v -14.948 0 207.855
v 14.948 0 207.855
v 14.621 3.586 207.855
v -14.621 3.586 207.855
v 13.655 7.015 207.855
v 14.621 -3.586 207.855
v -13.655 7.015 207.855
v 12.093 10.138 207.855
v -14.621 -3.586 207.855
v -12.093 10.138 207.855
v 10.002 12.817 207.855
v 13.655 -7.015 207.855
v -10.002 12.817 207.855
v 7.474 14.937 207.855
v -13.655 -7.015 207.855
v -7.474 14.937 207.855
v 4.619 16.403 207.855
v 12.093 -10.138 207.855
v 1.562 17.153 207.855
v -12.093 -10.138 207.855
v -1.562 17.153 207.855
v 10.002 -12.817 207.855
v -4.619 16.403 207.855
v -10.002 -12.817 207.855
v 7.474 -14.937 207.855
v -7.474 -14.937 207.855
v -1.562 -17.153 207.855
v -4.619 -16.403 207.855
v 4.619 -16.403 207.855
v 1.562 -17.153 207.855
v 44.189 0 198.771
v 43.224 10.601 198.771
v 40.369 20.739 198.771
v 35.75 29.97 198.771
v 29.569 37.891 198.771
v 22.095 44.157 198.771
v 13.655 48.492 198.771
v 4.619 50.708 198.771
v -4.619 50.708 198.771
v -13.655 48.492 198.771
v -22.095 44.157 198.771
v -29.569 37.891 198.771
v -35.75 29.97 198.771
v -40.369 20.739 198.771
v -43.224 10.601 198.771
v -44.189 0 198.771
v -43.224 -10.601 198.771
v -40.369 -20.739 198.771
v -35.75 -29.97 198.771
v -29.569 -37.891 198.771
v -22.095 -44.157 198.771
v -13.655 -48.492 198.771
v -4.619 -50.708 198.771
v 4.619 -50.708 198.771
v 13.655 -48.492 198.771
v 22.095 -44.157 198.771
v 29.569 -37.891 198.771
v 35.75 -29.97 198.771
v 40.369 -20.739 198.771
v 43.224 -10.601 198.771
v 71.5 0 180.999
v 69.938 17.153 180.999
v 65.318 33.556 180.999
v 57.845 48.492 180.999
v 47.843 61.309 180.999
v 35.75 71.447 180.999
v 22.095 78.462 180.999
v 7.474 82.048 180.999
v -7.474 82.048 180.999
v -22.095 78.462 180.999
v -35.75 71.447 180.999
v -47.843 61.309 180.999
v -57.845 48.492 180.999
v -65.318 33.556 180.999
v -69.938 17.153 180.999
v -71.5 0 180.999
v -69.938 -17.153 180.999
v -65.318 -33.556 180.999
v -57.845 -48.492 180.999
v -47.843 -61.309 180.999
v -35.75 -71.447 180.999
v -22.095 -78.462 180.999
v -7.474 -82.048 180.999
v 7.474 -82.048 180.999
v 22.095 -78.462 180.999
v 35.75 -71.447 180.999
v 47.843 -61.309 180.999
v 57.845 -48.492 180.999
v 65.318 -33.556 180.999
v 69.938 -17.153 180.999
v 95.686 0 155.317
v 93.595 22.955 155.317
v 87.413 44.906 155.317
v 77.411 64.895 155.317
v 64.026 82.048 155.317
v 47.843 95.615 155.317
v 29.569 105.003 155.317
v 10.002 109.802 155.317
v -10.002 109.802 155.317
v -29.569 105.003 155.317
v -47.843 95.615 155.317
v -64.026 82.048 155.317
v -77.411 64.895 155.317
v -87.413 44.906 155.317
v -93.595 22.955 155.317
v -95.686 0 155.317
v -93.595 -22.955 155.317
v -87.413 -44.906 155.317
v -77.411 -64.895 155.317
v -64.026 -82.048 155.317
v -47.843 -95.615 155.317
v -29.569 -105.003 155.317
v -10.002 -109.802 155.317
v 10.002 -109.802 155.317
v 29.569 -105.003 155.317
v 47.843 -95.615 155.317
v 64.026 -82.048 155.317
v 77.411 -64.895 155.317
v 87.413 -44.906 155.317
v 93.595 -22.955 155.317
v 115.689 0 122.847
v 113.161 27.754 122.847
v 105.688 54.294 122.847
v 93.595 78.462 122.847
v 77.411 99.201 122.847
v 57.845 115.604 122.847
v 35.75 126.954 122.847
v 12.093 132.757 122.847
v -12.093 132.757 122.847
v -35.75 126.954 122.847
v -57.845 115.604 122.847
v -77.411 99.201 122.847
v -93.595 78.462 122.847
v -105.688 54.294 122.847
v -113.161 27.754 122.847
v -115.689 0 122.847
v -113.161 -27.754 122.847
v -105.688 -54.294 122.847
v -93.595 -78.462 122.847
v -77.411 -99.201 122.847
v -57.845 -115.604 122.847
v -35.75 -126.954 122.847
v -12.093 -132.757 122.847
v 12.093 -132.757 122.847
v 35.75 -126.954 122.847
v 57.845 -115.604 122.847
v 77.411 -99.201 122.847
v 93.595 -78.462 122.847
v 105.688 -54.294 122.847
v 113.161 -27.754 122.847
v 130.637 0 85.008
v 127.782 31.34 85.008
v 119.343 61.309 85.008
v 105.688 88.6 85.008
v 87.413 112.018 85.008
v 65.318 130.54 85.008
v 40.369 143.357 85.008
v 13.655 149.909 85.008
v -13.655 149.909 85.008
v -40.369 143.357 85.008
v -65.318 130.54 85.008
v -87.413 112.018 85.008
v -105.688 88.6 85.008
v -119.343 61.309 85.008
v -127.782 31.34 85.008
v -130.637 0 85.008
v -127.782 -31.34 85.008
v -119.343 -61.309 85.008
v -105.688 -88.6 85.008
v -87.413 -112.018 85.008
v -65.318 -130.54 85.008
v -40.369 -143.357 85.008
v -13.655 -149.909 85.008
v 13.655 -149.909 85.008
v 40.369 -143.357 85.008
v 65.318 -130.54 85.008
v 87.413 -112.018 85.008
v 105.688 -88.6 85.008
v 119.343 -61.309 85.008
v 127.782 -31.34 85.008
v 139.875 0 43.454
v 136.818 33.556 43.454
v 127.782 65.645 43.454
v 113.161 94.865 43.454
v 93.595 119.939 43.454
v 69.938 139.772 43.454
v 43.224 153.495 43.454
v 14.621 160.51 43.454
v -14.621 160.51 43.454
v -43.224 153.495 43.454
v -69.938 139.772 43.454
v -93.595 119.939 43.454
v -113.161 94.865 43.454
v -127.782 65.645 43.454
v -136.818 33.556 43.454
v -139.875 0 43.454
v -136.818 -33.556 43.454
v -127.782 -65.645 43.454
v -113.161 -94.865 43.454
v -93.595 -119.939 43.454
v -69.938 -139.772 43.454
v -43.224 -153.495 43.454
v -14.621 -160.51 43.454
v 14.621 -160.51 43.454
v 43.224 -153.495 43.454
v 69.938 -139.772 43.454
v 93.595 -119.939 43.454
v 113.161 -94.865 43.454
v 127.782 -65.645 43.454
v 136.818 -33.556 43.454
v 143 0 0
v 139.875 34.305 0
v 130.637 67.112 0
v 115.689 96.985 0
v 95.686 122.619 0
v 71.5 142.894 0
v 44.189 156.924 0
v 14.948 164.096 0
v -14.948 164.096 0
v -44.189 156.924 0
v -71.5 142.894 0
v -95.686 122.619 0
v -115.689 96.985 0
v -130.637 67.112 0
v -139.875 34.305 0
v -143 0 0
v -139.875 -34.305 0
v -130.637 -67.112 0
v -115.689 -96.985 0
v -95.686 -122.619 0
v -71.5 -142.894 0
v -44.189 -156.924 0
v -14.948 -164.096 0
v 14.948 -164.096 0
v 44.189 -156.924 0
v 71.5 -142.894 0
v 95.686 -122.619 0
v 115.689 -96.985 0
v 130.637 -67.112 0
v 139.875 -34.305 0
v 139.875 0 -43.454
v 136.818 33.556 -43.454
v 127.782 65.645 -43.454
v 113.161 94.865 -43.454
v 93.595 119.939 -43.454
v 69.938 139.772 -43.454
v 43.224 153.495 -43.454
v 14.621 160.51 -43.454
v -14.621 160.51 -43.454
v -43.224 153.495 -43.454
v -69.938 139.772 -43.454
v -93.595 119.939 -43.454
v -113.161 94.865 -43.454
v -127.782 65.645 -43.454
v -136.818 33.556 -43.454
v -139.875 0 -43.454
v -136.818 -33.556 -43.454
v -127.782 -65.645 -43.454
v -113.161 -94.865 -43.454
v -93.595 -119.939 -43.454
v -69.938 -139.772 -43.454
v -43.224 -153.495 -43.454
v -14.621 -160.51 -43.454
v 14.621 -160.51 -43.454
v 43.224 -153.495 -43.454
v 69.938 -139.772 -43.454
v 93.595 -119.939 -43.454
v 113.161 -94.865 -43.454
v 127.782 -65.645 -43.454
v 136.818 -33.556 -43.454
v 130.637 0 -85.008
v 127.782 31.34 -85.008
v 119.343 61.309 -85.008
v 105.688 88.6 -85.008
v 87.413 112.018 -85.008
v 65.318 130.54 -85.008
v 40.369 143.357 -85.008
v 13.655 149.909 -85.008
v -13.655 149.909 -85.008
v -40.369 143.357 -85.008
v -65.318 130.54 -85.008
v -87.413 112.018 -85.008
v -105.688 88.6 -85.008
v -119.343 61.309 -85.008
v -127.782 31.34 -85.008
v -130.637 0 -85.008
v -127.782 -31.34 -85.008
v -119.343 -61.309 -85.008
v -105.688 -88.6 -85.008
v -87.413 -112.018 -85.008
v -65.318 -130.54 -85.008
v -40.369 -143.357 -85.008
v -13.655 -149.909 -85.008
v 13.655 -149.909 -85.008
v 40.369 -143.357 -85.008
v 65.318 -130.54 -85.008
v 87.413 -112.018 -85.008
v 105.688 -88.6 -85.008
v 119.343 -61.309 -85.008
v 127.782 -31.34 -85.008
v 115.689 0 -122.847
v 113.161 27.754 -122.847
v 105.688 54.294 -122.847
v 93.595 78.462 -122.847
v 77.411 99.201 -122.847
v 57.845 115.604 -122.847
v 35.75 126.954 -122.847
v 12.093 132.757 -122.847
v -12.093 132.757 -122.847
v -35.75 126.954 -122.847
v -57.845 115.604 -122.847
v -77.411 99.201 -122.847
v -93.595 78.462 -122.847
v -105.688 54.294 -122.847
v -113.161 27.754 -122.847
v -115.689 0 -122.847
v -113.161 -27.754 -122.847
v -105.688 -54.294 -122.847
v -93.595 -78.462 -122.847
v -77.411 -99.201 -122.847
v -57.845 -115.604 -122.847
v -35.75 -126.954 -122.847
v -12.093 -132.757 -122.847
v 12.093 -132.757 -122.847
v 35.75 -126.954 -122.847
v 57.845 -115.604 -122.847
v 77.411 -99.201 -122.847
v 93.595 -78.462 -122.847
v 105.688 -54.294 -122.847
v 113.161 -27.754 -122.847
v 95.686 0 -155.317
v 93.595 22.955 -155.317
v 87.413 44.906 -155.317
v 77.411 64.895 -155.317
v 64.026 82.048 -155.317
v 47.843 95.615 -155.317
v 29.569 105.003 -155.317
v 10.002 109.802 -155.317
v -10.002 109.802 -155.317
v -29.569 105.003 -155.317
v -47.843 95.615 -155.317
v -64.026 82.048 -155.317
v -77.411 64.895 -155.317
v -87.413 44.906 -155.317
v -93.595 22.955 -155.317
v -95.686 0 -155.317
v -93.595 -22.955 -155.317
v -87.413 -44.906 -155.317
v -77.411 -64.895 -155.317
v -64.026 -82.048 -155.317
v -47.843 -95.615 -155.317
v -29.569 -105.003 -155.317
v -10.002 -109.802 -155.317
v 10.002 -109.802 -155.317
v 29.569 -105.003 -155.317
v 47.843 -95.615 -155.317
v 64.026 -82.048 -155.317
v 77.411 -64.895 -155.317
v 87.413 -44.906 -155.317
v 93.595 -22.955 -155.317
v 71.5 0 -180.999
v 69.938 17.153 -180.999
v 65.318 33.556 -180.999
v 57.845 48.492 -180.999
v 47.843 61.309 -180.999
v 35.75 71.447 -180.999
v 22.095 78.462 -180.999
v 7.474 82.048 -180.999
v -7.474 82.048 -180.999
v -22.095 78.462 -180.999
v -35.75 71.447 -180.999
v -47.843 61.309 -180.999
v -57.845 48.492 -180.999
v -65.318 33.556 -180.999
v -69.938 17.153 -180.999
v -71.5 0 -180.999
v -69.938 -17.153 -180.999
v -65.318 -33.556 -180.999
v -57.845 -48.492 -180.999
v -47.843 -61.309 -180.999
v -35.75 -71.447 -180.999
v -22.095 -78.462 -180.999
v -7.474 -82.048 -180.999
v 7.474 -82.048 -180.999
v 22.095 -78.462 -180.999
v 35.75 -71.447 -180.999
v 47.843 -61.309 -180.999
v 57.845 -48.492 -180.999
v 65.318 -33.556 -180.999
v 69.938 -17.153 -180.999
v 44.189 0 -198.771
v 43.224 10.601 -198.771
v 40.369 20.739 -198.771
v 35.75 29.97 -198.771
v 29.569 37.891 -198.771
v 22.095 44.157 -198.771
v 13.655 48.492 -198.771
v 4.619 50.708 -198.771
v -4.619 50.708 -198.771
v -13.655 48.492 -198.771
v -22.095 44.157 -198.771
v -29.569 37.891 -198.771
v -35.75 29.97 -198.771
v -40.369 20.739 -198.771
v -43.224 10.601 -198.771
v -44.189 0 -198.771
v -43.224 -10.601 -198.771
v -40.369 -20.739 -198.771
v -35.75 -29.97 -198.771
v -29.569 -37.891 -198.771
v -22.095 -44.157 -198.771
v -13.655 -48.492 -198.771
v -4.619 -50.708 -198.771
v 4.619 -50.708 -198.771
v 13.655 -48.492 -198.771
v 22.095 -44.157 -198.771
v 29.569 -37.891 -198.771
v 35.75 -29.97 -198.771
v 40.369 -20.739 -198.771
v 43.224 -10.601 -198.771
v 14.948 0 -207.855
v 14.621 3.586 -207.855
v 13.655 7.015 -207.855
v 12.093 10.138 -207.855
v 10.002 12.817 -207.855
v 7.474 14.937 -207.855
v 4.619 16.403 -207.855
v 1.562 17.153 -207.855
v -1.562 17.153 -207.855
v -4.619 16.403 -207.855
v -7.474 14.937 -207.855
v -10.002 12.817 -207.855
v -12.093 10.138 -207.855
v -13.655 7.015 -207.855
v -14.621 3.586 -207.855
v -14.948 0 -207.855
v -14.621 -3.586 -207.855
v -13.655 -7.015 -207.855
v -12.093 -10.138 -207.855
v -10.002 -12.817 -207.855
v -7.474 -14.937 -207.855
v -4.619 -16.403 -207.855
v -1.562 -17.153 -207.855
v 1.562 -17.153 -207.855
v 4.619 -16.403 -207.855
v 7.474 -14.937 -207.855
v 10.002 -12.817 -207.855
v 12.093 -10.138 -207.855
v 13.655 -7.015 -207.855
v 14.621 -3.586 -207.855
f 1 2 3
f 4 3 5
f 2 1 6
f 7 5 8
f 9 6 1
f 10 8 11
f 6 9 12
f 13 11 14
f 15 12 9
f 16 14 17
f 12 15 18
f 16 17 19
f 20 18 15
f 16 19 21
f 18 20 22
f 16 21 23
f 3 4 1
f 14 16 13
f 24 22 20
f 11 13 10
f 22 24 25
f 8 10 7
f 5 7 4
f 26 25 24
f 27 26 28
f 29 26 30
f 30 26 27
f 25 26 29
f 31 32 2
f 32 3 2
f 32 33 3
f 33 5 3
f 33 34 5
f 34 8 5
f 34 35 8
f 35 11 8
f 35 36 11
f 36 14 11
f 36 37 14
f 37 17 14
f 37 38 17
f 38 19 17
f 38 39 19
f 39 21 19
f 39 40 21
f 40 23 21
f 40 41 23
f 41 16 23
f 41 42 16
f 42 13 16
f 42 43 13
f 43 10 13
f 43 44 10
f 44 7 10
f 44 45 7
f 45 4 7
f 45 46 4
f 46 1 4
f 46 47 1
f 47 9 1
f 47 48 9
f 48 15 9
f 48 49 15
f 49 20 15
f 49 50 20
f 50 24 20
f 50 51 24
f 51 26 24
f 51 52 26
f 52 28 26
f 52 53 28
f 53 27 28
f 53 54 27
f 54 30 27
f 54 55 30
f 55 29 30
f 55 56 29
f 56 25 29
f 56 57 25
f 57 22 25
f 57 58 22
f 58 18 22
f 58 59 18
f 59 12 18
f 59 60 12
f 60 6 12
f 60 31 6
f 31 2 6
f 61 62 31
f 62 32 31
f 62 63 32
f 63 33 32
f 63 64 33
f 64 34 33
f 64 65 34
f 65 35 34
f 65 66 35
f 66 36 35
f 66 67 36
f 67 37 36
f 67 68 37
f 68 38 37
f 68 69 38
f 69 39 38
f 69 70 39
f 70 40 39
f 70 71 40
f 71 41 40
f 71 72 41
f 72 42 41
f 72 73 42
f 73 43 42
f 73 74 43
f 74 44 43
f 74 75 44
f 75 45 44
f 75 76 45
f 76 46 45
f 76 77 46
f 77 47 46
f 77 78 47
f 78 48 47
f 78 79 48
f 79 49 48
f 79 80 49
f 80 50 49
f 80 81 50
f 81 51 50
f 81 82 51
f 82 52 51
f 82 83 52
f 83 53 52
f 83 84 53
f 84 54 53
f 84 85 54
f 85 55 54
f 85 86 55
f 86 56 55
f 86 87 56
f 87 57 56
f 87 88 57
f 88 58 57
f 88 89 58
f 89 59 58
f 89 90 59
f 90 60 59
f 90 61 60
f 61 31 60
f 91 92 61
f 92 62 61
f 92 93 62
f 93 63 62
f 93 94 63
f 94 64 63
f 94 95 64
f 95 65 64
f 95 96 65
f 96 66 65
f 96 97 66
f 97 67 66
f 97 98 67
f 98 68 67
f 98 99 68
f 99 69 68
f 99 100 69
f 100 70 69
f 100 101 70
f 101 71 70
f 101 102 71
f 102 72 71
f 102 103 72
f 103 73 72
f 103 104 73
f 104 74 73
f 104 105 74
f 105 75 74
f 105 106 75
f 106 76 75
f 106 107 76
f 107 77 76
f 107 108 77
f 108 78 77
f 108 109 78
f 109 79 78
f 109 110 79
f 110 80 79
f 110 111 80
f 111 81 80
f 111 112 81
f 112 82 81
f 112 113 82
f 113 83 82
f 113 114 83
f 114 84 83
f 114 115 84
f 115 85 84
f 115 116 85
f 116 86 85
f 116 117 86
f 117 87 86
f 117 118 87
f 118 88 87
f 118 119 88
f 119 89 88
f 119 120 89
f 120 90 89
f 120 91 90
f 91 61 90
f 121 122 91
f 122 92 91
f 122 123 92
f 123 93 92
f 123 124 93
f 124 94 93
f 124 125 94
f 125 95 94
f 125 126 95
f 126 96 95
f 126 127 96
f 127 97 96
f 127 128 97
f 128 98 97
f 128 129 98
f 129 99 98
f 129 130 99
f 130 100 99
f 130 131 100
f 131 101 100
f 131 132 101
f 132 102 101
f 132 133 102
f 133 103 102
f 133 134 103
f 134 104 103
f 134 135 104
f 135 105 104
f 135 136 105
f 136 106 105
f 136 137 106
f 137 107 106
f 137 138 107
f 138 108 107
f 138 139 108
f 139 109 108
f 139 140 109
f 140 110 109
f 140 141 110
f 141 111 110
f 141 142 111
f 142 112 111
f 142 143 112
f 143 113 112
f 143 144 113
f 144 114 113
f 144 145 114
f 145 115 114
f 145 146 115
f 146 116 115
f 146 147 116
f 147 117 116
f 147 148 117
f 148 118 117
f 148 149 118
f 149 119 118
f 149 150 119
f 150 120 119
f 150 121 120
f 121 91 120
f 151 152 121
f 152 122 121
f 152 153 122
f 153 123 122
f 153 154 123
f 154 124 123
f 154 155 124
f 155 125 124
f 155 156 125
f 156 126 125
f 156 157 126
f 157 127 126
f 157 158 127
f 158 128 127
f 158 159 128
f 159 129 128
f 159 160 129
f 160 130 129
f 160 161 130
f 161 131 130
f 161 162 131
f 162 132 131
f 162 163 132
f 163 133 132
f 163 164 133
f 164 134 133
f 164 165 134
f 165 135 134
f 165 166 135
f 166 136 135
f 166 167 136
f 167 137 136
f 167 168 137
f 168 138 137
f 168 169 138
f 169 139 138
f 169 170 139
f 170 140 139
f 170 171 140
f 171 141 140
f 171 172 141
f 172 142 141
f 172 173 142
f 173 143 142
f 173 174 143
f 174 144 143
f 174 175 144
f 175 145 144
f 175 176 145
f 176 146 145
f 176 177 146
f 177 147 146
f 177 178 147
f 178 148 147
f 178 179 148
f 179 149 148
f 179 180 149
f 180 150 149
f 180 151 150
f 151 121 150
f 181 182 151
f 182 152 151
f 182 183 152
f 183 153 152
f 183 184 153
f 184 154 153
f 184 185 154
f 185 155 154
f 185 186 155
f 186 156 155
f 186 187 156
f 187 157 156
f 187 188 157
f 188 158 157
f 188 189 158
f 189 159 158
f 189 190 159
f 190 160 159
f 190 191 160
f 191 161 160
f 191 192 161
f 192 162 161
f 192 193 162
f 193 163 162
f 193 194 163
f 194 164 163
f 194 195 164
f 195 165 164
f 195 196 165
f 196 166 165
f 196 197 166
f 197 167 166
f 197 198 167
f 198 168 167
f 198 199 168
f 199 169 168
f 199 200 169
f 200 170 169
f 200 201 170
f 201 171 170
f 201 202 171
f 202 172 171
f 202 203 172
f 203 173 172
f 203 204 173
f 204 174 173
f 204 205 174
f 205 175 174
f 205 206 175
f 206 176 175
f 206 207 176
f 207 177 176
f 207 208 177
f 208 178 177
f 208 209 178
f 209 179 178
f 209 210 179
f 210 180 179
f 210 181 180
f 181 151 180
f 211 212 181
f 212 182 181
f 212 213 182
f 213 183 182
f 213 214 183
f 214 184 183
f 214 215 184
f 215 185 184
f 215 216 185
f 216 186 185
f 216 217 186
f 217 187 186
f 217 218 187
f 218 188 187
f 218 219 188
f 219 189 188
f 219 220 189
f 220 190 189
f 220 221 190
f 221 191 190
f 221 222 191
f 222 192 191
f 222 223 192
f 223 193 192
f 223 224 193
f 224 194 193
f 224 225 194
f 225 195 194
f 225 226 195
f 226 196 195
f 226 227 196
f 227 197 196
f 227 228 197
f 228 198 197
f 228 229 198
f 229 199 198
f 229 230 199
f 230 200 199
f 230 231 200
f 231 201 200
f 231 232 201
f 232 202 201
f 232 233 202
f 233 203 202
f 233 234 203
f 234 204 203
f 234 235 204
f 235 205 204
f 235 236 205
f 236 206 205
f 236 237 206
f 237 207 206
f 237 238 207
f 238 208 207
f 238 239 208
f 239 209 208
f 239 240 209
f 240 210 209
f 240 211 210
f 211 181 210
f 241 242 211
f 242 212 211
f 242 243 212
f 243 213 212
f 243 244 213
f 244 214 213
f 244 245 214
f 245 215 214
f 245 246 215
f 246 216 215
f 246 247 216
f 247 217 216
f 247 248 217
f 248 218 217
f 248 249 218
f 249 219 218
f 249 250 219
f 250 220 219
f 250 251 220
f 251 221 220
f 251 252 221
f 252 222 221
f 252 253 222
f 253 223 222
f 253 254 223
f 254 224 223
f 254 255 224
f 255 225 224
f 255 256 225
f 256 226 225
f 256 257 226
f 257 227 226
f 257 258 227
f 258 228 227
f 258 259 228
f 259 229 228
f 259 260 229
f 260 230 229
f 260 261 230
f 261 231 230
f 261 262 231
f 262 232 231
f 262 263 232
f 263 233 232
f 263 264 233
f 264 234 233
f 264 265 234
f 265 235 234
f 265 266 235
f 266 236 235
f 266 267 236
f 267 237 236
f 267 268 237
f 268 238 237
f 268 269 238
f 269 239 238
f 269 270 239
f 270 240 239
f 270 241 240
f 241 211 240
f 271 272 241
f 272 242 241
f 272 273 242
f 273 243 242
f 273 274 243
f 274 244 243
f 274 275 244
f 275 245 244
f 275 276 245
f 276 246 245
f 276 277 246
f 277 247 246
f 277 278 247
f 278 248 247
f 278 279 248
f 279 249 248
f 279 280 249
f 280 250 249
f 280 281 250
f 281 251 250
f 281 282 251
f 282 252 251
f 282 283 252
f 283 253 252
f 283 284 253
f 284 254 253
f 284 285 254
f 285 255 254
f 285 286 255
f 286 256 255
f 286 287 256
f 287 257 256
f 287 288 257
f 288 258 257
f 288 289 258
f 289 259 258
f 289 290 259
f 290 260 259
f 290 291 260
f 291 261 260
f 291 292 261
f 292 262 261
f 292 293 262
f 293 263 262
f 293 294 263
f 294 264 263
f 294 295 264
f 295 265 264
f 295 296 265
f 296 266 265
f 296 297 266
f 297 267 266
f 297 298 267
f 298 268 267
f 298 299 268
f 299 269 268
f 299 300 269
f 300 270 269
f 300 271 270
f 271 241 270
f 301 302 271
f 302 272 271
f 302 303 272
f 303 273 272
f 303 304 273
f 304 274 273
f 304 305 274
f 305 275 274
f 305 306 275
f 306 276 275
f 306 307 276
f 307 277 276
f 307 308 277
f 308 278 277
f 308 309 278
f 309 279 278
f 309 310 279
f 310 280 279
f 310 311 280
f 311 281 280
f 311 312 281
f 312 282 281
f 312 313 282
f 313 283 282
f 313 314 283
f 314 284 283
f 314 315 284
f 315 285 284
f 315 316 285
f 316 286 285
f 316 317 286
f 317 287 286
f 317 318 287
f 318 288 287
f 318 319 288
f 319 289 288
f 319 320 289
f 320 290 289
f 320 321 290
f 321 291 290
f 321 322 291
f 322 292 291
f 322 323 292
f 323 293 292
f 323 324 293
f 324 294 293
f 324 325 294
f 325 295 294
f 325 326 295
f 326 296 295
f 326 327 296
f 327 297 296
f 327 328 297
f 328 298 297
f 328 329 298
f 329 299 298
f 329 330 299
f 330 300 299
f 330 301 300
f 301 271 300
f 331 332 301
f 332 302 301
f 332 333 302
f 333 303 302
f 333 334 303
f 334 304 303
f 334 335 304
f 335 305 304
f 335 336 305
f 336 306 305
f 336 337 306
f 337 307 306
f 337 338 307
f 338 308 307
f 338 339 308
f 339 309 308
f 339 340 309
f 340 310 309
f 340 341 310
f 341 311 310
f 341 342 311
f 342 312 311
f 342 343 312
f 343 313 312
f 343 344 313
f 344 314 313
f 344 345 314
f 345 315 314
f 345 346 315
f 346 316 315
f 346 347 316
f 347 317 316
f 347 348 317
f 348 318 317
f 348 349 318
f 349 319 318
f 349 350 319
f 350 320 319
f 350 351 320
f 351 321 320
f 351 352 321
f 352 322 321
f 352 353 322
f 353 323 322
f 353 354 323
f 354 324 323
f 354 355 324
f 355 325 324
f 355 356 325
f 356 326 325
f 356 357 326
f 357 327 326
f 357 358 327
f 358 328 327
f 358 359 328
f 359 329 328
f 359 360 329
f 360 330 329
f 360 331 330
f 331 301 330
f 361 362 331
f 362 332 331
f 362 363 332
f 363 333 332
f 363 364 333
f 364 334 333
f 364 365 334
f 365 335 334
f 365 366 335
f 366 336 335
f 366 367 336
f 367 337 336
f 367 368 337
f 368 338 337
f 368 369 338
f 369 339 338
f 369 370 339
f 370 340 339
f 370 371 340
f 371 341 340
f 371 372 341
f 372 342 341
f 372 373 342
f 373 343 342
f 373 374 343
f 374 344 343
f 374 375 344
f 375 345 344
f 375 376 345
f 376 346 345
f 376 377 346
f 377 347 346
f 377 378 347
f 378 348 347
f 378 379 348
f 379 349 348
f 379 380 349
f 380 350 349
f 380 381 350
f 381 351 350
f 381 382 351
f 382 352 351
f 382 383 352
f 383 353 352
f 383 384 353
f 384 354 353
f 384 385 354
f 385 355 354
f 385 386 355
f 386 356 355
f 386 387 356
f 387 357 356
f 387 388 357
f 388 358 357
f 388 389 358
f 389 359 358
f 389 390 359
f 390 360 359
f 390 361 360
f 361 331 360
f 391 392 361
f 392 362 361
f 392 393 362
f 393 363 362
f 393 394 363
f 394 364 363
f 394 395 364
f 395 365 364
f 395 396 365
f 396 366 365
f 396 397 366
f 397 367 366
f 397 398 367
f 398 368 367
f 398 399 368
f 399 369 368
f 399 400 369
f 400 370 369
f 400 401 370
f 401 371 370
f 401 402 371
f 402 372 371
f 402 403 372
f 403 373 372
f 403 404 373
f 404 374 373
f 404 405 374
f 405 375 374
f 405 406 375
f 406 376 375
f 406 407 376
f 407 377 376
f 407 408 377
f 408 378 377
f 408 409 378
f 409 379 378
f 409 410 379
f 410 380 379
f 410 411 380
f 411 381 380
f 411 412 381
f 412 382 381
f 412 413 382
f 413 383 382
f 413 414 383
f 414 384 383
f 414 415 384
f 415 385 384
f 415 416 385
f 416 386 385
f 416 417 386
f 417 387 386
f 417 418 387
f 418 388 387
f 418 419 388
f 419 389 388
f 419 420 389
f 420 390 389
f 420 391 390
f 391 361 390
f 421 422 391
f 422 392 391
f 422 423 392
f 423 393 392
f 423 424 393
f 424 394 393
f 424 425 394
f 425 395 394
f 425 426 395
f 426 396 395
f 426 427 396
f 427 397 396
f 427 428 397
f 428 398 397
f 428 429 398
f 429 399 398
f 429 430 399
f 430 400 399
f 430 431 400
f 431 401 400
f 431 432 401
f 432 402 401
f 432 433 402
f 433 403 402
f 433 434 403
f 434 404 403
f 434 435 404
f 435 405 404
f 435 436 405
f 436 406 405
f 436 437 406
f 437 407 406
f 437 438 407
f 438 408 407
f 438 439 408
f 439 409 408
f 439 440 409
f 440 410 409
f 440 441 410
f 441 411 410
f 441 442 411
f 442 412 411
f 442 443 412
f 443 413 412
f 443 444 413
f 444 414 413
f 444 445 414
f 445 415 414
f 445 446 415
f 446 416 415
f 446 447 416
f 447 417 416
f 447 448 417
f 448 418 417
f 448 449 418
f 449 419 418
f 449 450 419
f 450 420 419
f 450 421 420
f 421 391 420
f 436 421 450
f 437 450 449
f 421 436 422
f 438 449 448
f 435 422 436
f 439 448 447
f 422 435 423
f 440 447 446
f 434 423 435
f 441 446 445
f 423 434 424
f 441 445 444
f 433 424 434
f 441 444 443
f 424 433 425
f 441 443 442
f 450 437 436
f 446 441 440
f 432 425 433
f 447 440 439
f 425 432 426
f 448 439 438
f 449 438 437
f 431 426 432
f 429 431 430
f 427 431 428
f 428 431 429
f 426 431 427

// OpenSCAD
// Generated by SolidPython 1.0.1 on 2020-07-29 00:46:51


scale(v = [13, 15, 19]) {
	sphere(r = 11);
}
/***********************************************
*********      SolidPython code:      **********
************************************************
 
# import packages: SolidPython
from solid import *
from solid.utils import *
from itertools import chain, combinations, permutations


class Resize:

    def __init__(self, scad_file):
        self.scad_file = scad_file
        #self.scad_file = import_scad(scad_file)
        # cone/cylinder param:
        self.r1 = 0
        self.r2 = 0
        self.h = 0
        # rectangular prism param:
        self.w = 0
        self.l = 0
        # ellipse param:
        self.r = 0

    # import OpenScad code (file name corresponds to shape)


    # classify shape + parameters
    def assign(self, param1, param2, param3):
        if self.scad_file == 'cone.scad':
            self.r1 = param1
            self.r2 = param2
            self.h = param3
        elif self.scad_file == 'cylinder.scad':
            self.r1 = param1
            self.r2 = param2
            self.h = param3
        elif self.scad_file == 'rectangularPrism.scad':
            self.h = param1
            self.l = param2
            self.w = param3
        else:
            self.r = param1
            self.h = param2

    # resize parameters
    def iterate(self):
        x = range(3, 20, 2)
        i = 1
        if self.scad_file == 'cone.scad':
            tempList = list(permutations(x, 2))
            for temp in tempList:
                param1 = temp[0]
                param2 = temp[1]
                filepath = 'produced_scad_files/' + 'cone' + str(param1) + '_' + str(param2) + '_' + '.scad'
                scad_render_to_file(cylinder(h=param1, r1=param2, r2=0), filepath)

        elif self.scad_file == 'cylinder.scad':
            tempList = list(permutations(x, 3))
            for temp in tempList:
                param1 = temp[0]
                param2 = temp[1]
                filepath = 'produced_scad_files/' + 'cylinder' + str(param1) + '_' + str(param2) + '_' + '.scad'
                scad_render_to_file(cylinder(h=param1, r1=param2, r2=param2), filepath)

        elif self.scad_file == 'rectangularPrism.scad':
            tempList = list(permutations(x, 3))
            for temp in tempList:
                param1 = temp[0]
                param2 = temp[1]
                param3 = temp[2]
                filepath = 'produced_scad_files/' + 'rectangularPrism' + str(param1) + '_' + str(param2) + '_' + str(
                    param3) + '.scad'
                scad_render_to_file(cube(size=(param1, param2, param3)), filepath)

        elif self.scad_file == 'ellipse.scad':
            tempList = list(permutations(x, 4))
            for temp in tempList:
                param1 = temp[0]
                param2 = temp[1]
                param3 = temp[2]
                param4 = temp[3]
                filepath = 'produced_scad_files/' + 'ellipse' + str(param1) + '_' + str(param2) + '_' + str(param3) + '_' + str(param4) + '.scad'
                scad_render_to_file(scale([param1, param2, param3])(sphere(r=param4)), filepath)

    def render_to_scadfile(self):
        scad_render_to_file(scad, 'example.scad') 
 
************************************************/
